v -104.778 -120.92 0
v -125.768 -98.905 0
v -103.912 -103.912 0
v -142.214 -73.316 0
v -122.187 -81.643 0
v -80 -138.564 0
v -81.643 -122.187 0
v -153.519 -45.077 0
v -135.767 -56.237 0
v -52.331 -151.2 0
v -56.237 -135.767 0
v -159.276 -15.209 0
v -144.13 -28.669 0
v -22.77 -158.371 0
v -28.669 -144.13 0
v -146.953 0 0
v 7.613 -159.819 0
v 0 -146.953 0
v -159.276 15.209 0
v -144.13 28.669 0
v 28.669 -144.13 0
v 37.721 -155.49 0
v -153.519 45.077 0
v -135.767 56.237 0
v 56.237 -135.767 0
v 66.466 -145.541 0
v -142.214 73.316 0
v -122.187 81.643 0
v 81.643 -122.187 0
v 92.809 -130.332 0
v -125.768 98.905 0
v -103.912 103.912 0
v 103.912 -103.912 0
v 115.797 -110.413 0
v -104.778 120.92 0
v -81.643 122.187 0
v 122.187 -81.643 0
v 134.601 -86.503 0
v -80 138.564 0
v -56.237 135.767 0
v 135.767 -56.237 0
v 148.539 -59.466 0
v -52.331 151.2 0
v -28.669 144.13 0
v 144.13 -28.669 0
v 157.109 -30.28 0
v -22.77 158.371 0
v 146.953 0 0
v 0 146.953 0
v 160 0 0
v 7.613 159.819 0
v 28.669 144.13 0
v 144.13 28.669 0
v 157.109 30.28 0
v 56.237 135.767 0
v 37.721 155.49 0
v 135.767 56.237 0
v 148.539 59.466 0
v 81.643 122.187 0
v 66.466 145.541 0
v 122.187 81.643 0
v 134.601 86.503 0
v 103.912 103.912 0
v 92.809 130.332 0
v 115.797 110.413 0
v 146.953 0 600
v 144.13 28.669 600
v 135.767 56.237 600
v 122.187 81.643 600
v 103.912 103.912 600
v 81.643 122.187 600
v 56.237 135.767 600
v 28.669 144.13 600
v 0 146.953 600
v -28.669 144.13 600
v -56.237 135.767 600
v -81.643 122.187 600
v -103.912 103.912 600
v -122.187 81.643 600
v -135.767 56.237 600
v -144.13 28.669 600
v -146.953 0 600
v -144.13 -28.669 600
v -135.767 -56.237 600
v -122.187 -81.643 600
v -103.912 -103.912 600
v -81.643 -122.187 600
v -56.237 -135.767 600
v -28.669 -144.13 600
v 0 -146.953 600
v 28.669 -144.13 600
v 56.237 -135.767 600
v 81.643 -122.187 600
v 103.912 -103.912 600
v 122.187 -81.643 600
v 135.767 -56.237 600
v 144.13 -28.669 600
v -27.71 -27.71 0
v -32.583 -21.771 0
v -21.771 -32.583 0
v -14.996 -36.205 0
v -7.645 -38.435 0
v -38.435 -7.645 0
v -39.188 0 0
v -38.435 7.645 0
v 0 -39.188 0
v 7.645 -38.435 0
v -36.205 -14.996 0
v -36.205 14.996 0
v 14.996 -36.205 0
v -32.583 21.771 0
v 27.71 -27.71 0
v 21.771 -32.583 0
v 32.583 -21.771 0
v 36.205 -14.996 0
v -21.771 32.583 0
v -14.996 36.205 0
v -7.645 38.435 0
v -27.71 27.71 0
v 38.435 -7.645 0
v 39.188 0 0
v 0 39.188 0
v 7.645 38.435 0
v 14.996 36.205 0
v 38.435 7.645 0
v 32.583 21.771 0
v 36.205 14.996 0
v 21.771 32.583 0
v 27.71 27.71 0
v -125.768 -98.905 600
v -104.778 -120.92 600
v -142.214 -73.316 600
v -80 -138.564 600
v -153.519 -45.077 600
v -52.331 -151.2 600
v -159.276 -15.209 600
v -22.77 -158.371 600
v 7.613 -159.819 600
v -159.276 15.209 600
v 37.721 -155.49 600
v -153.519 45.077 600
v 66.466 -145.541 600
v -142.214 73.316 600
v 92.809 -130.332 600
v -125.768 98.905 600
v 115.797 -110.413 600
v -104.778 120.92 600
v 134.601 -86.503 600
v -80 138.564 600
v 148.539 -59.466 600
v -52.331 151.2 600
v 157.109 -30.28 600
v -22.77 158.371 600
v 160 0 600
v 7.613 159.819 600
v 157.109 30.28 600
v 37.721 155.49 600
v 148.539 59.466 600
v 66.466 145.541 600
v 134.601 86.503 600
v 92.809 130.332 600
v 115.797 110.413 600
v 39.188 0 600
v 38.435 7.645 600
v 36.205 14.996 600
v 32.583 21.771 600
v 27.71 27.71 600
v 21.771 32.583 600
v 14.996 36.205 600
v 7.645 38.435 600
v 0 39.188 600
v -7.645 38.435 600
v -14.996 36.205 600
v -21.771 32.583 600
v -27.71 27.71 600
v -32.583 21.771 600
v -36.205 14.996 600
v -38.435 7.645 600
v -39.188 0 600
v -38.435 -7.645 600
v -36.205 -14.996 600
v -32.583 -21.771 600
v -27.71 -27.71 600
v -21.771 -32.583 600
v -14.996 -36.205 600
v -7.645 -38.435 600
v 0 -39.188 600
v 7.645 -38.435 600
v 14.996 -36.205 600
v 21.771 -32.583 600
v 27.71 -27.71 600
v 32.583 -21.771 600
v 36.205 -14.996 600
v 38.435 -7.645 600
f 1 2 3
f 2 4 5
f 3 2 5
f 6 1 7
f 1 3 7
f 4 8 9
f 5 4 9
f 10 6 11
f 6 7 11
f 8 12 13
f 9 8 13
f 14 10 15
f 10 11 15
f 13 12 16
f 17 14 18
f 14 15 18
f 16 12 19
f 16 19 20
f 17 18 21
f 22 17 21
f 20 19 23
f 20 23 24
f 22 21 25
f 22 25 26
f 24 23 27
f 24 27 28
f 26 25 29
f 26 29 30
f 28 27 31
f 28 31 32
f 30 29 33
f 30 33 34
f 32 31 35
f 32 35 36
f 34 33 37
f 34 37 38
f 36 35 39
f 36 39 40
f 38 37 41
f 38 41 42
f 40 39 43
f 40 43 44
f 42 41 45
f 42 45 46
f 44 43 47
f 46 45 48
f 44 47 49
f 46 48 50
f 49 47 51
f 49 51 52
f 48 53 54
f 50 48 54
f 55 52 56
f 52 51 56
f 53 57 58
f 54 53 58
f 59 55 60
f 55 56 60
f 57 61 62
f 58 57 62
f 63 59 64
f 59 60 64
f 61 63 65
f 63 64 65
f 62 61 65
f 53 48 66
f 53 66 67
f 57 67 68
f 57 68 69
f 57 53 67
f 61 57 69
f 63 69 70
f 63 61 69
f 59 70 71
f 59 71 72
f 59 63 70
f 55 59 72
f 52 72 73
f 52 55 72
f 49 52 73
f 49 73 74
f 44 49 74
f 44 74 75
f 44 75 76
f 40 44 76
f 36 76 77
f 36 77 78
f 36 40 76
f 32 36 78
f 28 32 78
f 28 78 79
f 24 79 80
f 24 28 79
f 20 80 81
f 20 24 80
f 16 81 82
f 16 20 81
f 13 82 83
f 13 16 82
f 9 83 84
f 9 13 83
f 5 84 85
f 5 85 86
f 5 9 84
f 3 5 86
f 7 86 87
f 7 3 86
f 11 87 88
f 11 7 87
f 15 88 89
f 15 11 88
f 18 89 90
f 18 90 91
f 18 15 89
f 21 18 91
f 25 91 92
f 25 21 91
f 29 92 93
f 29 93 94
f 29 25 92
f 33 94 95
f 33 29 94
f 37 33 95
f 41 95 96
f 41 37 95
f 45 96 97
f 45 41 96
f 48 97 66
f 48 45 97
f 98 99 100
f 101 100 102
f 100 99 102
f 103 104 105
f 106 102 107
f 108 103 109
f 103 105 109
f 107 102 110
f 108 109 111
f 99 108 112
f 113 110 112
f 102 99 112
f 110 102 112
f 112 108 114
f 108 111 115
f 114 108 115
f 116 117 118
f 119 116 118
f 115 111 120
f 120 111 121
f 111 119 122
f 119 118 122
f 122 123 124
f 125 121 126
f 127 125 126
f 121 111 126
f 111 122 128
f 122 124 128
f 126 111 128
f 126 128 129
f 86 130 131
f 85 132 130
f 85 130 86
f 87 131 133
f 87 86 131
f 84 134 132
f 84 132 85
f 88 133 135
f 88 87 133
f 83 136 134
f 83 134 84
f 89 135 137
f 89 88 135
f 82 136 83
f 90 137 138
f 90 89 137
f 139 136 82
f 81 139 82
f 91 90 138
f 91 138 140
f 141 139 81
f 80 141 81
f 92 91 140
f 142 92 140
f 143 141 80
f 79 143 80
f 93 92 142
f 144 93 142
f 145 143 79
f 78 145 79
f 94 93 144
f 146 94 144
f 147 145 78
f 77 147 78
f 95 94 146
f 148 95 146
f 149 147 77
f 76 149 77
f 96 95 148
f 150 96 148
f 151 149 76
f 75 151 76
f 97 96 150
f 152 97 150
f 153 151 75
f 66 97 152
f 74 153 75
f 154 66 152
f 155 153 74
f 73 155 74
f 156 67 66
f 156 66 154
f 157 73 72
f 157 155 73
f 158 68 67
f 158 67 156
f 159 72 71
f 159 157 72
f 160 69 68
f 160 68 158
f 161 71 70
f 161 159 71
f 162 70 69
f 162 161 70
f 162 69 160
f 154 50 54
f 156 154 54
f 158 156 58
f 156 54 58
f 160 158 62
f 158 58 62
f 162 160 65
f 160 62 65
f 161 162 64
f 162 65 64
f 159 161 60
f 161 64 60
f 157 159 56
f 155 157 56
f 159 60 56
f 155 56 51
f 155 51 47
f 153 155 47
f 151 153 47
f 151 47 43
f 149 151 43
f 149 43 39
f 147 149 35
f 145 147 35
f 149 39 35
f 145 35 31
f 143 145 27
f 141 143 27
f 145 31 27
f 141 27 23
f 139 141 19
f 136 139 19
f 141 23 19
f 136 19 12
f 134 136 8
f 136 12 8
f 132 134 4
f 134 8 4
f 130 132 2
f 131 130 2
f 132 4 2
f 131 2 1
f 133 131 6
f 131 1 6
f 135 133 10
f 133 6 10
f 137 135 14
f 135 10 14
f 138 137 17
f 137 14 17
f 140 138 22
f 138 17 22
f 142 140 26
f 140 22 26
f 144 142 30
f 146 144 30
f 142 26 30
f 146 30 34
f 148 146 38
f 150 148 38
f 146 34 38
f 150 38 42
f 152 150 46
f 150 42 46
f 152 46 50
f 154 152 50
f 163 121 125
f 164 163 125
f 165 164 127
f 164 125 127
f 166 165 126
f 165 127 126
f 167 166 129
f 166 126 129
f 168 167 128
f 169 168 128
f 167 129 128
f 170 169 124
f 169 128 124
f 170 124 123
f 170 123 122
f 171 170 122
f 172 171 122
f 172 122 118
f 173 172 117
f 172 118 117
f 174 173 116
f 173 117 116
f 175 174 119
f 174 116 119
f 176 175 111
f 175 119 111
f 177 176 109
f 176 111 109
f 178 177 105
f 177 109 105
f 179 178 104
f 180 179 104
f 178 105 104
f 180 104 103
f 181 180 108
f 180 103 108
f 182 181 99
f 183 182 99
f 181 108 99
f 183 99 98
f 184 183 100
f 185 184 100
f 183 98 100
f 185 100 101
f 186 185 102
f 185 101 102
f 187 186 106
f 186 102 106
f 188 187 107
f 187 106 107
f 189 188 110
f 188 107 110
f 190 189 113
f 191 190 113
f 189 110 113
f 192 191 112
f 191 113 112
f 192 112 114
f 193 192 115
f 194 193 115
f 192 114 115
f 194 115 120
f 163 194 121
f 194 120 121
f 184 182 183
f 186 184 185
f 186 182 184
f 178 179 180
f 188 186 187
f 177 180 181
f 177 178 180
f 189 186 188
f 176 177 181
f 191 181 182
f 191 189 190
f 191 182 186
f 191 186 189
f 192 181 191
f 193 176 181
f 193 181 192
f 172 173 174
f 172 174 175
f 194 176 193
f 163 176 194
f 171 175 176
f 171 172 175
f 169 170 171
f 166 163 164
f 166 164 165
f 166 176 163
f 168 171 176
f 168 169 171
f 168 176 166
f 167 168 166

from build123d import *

# Parameters (mm, degrees)
F0_R     = 39.18751
F1_DEPTH = 600
F0_R_2   = 160
F0_R_3   = 146.953164
F2_DEPTH = 600


with BuildPart() as f1:
    # F0 (on Top) → F1 (new body)
    with BuildSketch(Plane.XY):
        Circle(F0_R)
    extrude(amount=F1_DEPTH)


with BuildPart() as f2:
    # F0 (on Top) → F2 (new body)
    with BuildSketch(Plane.XY):
        Circle(F0_R_2)
        Circle(F0_R_3, mode=Mode.SUBTRACT)
    extrude(amount=F2_DEPTH)


solid = Compound([f1.part, f2.part])
